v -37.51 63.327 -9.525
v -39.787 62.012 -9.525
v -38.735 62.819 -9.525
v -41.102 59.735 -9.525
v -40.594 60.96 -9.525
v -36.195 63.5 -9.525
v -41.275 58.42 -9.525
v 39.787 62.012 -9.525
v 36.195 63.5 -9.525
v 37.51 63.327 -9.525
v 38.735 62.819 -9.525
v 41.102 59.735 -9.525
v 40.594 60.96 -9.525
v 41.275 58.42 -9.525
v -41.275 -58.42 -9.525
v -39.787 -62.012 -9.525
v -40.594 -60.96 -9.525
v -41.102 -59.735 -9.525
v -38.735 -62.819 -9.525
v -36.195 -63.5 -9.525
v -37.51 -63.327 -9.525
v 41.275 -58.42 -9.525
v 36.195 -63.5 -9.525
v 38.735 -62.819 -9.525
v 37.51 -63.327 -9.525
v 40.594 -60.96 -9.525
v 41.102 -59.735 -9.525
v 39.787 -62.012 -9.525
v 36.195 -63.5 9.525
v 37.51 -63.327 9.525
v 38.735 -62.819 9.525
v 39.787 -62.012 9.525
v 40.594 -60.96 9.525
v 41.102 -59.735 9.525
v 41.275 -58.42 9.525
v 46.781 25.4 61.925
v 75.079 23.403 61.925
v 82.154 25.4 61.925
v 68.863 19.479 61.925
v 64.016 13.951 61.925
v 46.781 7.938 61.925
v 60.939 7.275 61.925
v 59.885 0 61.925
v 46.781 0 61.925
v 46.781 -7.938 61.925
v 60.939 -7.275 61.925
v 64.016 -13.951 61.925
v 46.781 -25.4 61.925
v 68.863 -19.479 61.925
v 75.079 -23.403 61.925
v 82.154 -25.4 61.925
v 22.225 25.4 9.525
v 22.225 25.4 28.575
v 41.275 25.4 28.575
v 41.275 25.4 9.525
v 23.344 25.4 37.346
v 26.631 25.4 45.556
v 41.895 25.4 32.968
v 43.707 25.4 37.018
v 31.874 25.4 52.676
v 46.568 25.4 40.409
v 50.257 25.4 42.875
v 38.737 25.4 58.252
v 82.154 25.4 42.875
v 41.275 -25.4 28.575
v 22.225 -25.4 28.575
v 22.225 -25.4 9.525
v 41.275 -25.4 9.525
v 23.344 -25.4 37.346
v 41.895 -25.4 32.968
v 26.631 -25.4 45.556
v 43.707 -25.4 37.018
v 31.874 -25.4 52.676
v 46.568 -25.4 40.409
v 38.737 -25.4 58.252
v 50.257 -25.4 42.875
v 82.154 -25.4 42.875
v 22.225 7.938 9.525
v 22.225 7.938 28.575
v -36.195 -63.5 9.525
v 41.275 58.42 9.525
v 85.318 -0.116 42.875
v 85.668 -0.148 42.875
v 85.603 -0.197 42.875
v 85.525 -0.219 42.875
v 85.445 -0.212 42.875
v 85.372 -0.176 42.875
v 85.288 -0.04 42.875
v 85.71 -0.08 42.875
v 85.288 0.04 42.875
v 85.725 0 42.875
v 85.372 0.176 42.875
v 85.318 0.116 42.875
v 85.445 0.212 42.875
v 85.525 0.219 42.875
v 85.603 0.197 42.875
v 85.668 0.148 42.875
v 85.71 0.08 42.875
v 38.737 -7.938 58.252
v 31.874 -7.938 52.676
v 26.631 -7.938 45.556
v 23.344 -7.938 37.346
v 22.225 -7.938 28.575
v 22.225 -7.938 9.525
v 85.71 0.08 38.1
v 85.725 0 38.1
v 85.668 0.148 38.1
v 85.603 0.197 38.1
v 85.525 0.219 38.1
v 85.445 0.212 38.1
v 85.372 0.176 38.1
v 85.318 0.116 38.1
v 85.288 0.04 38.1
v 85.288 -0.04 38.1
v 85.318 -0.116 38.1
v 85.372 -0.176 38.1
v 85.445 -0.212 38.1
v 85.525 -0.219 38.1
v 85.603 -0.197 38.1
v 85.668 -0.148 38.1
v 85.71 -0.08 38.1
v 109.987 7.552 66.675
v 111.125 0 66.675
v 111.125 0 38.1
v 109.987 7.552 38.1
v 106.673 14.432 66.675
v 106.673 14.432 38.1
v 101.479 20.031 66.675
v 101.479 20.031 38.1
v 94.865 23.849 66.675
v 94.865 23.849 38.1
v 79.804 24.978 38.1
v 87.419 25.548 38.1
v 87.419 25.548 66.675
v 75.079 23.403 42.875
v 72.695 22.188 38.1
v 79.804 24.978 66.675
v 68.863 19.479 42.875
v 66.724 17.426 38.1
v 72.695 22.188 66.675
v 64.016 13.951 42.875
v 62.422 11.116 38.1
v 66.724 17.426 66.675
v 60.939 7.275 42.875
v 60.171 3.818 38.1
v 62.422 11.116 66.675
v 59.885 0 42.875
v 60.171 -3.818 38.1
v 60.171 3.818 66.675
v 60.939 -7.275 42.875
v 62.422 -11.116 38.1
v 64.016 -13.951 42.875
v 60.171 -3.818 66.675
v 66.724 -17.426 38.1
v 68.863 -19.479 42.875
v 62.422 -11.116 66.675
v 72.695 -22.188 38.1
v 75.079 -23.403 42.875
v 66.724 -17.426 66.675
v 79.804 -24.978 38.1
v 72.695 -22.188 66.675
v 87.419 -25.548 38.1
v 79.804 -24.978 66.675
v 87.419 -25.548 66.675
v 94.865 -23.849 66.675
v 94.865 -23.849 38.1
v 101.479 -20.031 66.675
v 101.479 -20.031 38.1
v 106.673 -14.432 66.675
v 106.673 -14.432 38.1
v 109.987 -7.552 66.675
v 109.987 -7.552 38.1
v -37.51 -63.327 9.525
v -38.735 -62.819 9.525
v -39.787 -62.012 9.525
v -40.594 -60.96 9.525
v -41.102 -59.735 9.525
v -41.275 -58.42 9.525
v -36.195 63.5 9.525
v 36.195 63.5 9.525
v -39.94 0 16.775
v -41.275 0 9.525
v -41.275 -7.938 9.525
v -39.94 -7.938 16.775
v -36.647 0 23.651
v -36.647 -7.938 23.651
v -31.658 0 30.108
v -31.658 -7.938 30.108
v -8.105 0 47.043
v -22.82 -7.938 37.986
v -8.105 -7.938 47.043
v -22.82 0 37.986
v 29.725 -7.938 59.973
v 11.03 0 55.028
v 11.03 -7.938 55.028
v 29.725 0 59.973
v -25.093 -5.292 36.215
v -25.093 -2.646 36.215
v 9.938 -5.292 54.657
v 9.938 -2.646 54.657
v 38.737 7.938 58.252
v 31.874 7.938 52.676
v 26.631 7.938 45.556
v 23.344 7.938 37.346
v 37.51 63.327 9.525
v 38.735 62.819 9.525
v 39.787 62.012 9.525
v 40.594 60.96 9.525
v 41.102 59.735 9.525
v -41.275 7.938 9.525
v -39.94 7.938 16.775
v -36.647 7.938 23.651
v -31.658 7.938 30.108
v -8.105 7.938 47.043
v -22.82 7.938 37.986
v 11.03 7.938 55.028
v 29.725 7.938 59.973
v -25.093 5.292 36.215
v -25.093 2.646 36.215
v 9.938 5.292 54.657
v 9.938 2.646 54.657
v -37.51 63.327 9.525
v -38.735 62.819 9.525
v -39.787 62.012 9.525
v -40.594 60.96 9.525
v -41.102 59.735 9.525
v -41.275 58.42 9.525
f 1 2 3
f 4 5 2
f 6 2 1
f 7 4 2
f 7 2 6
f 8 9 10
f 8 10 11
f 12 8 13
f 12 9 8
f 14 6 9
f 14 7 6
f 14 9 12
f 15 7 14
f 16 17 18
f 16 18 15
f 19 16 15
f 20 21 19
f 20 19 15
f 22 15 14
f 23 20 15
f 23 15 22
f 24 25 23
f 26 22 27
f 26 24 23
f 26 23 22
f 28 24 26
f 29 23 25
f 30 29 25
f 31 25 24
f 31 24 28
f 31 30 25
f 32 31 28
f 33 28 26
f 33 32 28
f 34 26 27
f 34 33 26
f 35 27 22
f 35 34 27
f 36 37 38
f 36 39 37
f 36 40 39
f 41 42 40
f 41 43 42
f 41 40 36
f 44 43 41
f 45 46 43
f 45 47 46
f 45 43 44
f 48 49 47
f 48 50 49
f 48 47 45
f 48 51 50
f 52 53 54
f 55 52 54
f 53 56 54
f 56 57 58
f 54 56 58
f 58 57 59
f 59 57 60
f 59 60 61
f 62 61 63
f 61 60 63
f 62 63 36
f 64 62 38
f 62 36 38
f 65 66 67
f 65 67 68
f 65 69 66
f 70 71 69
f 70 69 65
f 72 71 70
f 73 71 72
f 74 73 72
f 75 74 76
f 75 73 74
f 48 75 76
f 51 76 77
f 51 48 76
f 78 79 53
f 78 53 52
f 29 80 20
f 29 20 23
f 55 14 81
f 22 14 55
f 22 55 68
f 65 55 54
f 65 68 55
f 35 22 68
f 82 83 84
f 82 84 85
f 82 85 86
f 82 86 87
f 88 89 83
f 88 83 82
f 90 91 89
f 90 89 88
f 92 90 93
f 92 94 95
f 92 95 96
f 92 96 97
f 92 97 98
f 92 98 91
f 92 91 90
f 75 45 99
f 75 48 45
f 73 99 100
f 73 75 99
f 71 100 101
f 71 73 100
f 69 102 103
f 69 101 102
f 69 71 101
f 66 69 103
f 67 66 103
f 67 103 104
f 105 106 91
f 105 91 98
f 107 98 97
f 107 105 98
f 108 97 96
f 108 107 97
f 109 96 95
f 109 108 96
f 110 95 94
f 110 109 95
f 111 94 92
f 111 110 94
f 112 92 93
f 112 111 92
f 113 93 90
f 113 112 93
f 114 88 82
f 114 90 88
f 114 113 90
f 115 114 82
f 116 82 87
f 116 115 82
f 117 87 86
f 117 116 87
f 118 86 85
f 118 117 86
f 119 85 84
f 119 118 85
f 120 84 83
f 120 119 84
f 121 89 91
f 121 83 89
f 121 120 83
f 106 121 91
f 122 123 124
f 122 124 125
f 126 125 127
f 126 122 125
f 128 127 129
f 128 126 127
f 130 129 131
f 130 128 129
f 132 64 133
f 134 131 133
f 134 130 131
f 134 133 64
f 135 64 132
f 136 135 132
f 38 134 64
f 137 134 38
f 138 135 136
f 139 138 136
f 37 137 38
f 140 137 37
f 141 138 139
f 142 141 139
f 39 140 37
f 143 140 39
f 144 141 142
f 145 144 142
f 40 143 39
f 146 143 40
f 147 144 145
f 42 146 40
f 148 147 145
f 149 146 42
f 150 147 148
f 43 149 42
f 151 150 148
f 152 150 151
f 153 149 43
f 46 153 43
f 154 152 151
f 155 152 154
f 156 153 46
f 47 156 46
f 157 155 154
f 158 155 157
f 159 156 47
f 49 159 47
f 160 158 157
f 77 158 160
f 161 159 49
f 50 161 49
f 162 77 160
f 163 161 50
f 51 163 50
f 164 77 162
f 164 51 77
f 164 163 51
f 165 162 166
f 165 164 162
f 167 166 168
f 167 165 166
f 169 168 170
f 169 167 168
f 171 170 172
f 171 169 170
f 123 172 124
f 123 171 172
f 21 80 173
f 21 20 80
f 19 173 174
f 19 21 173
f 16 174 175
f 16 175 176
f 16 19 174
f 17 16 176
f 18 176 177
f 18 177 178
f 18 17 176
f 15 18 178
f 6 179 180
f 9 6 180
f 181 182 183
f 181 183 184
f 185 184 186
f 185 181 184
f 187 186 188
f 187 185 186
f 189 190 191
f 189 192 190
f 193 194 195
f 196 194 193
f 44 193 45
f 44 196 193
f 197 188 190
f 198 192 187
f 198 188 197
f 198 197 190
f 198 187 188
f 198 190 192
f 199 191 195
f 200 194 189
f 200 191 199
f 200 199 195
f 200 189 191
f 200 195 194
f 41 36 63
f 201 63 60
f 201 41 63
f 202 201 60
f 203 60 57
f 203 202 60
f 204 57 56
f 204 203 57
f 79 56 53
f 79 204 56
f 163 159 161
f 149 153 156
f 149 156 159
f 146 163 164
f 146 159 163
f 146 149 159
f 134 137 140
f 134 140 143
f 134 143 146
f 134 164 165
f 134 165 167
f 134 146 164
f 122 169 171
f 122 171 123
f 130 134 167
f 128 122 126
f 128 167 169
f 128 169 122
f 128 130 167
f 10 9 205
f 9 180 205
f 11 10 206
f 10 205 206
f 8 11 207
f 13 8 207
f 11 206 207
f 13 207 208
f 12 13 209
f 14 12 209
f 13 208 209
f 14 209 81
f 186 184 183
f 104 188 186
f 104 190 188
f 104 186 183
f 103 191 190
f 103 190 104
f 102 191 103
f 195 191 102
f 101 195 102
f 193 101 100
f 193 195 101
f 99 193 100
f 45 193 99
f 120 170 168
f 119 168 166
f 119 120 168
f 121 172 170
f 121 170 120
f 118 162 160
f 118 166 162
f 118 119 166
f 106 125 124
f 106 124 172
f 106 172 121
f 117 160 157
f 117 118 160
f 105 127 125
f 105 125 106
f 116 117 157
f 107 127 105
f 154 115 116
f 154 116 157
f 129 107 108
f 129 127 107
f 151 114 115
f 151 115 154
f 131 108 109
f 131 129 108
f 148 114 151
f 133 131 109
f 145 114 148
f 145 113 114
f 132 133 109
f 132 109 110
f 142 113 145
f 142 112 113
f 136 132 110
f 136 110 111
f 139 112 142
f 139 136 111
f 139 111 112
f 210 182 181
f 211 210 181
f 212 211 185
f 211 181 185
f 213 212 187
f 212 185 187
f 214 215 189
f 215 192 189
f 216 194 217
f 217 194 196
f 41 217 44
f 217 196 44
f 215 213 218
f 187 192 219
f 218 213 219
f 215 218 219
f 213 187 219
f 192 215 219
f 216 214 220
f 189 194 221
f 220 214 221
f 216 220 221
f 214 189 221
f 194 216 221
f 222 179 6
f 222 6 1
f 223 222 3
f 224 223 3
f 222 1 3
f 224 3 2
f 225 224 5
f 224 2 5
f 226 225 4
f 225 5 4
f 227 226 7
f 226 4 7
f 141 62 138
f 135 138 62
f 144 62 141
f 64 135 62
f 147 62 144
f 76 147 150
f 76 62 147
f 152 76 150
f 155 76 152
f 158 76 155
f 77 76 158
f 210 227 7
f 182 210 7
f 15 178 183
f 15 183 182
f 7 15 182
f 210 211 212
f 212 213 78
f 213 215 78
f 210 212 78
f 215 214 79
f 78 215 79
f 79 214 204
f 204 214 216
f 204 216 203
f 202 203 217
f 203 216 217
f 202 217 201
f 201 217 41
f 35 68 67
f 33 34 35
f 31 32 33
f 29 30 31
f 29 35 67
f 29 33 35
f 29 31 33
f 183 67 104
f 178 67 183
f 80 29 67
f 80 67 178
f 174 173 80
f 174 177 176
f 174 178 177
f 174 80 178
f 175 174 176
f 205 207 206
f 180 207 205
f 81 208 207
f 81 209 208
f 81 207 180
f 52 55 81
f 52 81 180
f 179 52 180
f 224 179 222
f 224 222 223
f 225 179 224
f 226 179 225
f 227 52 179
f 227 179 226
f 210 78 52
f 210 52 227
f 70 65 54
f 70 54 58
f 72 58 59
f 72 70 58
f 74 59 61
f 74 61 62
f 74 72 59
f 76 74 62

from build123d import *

# Parameters (mm, degrees)
F1_DEPTH = 63.5
F0_W     = 25.1798671365
F0_H     = 19.05
F2_DEPTH = 25.4
F3_DEPTH = 7.9375
F5_R     = 5.08


with BuildPart() as f1:
    # F0 (on Front) → F1 (new body, symmetric)
    with BuildSketch(Plane.XZ):
        Polygon((41.275, -9.525), (41.275, 9.525), (22.225, 9.525), (-41.275, 9.525), (-41.275, -9.525), align=None)
    extrude(amount=F1_DEPTH, both=True)

    # F0 (on Front) → F2 (join, symmetric)
    with BuildSketch(Plane.XZ):
        with BuildLine():
            Line((22.225, 9.525), (41.275, 9.525))
            Line((41.275, 9.525), (41.275, 28.575))
            ThreePointArc((41.275, 28.575), (43.7066106583, 37.0183943417), (50.2565317176, 42.8752))
            Line((50.2565317176, 42.8752), (60.325, 42.8752))
            Line((60.325, 42.8752), (60.325, 61.9252))
            Line((60.325, 61.9252), (46.7808252517, 61.9252))
            ThreePointArc((46.7808252517, 61.9252), (29.0261751083, 49.2826338209), (22.225, 28.575))
            Line((22.225, 28.575), (22.225, 9.525))
        make_face()
        with Locations((72.9149335682, 52.4002)):
            Rectangle(F0_W, F0_H)
    extrude(amount=F2_DEPTH, both=True)

    # F0 (on Front) → F3 (join, symmetric)
    with BuildSketch(Plane.XZ):
        with BuildLine():
            Line((-41.275, 9.525), (22.225, 9.525))
            Line((22.225, 9.525), (22.225, 28.575))
            ThreePointArc((22.225, 28.575), (29.0261751083, 49.2826338209), (46.7808252517, 61.9252))
            add(Edge.make_bspline(
                [(-41.275, 9.525), (-40.1955842972, 39.3650457263), (14.7107355297, 61.2183064222), (46.7808252517, 61.9252)],
                knots=[0, 0, 0, 0, 102.4676013226, 102.4676013226, 102.4676013226, 102.4676013226], degree=3))
        make_face()
    extrude(amount=F3_DEPTH, both=True)

    # F0 (on Front) → F4 (revolve)
    with BuildSketch(Plane.XZ):
        Polygon((85.5048671365, 61.9252), (85.5048671365, 42.8752), (85.725, 42.8752), (85.725, 38.1), (111.125, 38.1), (111.125, 66.675), (85.5048671365, 66.675), align=None)
    revolve(axis=Axis((85.5048671365, 0, 52.5966957748), (0, 0, 1)))

    # F5
    f5_edges = [f1.edges().sort_by_distance(p)[0] for p in [
        (-41.275, -63.5, 0),
        (41.275, -63.5, 0),
        (41.275, 63.5, 0),
        (-41.275, 63.5, 0),
    ]]
    fillet(f5_edges, radius=F5_R)


solid = f1.part
